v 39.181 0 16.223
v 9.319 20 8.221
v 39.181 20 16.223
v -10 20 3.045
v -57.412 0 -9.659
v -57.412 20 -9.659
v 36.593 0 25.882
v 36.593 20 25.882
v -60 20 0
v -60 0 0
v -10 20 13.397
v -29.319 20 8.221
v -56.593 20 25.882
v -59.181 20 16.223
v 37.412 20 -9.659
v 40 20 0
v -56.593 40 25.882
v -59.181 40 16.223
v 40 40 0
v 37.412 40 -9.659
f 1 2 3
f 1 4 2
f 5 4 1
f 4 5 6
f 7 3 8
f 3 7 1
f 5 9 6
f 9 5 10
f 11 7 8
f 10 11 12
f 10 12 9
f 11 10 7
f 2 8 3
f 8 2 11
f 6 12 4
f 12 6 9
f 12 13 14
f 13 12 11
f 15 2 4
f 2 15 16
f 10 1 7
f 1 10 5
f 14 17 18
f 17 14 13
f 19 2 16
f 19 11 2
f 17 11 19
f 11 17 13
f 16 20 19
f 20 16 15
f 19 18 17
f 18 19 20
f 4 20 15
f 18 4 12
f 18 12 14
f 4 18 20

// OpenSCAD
translate([-60, 0, 0])
	rotate([0, 75, 0])
		cube([10, 20, 100]);
translate([40, 20, 0])
	mirror([1, 0, 0])
		rotate([0, 75, 0])
		    cube([10, 20, 100]);
